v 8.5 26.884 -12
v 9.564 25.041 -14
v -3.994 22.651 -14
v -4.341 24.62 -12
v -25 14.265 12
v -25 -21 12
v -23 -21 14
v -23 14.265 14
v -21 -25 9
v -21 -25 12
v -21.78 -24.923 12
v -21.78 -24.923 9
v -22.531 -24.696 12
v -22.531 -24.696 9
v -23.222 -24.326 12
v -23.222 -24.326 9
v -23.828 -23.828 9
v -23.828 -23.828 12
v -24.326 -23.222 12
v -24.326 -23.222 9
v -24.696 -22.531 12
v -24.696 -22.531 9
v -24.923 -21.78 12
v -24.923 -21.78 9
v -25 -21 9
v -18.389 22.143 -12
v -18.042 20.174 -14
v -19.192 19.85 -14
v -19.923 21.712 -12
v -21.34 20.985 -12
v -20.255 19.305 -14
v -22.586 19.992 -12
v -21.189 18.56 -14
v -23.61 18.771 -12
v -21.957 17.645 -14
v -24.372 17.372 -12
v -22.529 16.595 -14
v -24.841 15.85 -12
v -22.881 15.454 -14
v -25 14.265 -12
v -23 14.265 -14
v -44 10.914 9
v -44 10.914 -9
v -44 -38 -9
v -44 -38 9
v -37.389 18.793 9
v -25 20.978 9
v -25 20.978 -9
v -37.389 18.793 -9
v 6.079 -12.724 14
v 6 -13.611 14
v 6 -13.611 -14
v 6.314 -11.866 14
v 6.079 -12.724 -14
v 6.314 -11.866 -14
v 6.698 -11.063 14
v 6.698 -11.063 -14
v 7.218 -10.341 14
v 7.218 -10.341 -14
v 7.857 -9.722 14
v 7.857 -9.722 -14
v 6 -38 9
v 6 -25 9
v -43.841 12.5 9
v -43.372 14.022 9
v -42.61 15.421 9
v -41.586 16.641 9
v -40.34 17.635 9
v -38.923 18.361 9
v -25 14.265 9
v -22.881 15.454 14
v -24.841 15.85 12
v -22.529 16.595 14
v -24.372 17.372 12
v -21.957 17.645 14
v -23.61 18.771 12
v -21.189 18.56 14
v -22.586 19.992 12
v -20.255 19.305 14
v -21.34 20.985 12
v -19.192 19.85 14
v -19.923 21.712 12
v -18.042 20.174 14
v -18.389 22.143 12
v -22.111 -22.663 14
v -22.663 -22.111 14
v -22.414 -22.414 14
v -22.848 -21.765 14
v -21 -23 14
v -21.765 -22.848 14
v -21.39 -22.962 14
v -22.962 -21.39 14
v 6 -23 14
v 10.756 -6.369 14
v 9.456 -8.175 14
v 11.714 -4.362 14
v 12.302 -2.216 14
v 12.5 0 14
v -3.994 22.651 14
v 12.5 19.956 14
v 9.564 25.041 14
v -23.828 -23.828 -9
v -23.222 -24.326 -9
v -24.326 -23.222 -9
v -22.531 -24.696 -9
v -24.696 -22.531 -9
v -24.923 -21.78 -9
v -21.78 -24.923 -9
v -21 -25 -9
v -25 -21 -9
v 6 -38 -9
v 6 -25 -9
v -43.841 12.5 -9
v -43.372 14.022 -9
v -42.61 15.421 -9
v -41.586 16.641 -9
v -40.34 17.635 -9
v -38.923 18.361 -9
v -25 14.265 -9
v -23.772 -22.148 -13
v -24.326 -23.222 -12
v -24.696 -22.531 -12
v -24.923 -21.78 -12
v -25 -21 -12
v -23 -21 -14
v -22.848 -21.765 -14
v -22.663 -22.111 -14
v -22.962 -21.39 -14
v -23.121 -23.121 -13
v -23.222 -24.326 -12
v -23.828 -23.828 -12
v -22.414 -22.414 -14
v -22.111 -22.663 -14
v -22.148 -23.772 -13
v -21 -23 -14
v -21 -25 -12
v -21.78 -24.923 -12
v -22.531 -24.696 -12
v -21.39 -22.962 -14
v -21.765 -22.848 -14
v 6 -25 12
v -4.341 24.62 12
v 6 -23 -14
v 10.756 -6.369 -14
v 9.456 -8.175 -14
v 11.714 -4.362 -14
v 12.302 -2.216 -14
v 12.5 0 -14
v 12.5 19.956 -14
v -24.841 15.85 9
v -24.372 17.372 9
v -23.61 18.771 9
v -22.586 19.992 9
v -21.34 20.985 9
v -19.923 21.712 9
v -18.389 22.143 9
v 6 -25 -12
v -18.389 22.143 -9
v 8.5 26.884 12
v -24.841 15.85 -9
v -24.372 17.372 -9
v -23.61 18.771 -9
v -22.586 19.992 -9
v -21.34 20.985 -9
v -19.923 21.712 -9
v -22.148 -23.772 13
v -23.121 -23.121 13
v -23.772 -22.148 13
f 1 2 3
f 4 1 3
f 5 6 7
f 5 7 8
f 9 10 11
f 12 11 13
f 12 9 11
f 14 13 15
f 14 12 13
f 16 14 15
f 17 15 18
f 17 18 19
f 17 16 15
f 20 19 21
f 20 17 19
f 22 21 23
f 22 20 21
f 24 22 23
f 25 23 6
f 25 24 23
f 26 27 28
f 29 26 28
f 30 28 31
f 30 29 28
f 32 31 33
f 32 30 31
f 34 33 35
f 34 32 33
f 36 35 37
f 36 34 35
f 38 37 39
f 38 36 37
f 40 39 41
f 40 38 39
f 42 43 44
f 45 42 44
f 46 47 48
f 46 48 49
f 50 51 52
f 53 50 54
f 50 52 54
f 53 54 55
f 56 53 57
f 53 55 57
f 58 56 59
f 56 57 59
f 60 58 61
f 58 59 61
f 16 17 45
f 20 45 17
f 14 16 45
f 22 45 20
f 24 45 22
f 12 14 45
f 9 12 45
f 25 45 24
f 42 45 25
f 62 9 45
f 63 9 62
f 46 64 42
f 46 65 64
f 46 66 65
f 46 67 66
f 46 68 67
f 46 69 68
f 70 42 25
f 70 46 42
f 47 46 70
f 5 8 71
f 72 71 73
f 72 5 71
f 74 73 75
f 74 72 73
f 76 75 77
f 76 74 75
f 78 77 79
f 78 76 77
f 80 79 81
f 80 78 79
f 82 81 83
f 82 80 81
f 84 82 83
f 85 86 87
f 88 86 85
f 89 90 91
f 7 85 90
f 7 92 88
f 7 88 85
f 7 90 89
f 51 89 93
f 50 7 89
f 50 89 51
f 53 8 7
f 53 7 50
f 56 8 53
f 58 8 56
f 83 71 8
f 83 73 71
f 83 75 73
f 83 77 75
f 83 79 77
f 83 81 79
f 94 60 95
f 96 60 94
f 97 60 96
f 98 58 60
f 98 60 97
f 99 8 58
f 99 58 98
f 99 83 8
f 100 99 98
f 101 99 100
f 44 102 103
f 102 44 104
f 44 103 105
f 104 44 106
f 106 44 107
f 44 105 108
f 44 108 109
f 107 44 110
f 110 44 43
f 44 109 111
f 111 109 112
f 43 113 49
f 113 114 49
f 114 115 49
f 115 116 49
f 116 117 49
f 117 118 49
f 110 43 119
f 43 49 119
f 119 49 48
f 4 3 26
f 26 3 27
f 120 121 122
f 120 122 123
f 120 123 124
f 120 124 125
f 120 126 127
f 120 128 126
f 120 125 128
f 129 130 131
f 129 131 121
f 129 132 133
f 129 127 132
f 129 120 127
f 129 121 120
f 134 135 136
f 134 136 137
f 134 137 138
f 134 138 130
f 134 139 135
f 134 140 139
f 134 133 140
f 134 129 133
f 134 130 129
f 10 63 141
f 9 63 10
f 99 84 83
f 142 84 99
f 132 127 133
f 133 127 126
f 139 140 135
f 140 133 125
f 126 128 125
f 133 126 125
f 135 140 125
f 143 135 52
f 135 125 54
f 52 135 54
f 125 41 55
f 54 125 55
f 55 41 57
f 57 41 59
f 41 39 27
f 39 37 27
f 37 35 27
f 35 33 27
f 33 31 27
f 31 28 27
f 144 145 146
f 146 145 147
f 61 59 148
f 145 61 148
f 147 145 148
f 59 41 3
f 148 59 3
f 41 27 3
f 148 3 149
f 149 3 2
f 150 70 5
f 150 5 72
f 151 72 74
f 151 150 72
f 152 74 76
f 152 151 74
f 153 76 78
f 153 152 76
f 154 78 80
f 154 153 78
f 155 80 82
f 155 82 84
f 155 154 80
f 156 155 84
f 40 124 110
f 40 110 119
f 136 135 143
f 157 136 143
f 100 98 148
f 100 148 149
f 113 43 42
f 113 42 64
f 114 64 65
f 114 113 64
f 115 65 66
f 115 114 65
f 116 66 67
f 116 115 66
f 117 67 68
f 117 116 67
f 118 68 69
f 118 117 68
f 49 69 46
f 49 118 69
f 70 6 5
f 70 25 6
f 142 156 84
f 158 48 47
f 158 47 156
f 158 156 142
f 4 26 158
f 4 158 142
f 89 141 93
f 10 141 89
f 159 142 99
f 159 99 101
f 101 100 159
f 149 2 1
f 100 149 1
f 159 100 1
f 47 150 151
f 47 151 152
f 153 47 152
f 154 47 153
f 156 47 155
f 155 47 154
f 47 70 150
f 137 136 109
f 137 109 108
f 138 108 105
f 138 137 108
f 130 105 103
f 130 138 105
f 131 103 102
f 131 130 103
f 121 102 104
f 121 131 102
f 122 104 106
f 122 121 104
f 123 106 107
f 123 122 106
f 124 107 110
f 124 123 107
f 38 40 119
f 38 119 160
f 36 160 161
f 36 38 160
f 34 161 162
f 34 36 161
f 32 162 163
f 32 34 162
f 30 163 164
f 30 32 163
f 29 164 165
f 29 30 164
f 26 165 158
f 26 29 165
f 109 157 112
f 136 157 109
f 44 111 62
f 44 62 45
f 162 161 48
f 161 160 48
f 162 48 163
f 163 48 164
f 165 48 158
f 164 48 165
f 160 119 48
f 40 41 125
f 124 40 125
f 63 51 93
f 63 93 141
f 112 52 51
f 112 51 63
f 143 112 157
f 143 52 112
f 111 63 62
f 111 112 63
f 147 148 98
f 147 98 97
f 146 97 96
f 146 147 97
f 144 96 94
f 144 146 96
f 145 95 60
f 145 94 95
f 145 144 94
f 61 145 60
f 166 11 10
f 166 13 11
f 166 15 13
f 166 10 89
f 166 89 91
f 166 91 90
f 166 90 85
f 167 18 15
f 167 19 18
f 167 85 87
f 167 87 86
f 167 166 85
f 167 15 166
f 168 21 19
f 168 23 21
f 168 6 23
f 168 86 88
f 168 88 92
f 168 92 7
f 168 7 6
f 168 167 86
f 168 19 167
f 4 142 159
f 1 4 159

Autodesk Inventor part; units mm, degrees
ref_plane "YZ Plane" through (0, 0, 0) normal (1, 0, 0) x (0, 1, 0)
ref_plane "XZ Plane" through (0, 0, 0) normal (0, 1, 0) x (-1, 0, 0)
ref_plane "XY Plane" through (0, 0, 0) normal (0, 0, 1) x (1, 0, 0)
sketch "Sketch1" plane through (0, 0, 0) normal (0, 0, 1) x (1, 0, 0)
  circle A0 centre (0, 0) radius 12.5
  circle A1 centre (0, 0) radius 25
  line L0 (-25, 0) -> (6, 0)
  line L1 (6, 0) -> (6, -25)
  line L2 (6, -25) -> (-25, -25)
  line L3 (-25, -25) -> (-25, 0)
  line L4 (12.5, 0) -> (12.5, 19.9562)
  line L5 (12.5, 19.9562) -> (8.5, 26.8844)
  line L6 (-4.3412, 24.6202) -> (8.5, 26.8844)
  line L7 (-25, 0) -> (-25, 20.9775)
  line L8 (-25, 20.9775) -> (-4.3412, 24.6202)
  line L9 (-20, -38) -> (0, -38) construction
  point P0 (6, -10.9659)
  point P1 (0, -25)
  point P2 (6, -24.2693)
  point P3 (-12.5, 0)
  dimension "d0" = 25
  dimension "d1" = 50
  dimension "d2" = 6
  dimension "d7" = 150
  dimension "d8" = 4
  dimension "d9" = 110
  dimension "d13" = 38
extrude "Extrusion1" add sketch "Sketch1" along normal mid plane 28 contours A0 L1 L0 | A0 L0 A1 L5 L4 | L0 L1 A0 | A0 L1 A1 L0 | L7 L8 A1 | A1 L2 L3 | L1 L2 A1 | A1 L6 L5
fillet "Fillet1" radius 5 1 edges at (6, -10.9659, 0)
sketch "Sketch2" plane through (0, 0, 0) normal (0, 0, 1) x (1, 0, 0)
  line L0 (8.5, 26.8844) -> (12.5, 19.9562) projected
  line L1 (12.5, 19.9562) -> (12.5, 0) projected
  arc A0 (7.8571, -9.7219) -> (12.5, 0) centre (0, 0) ccw projected
  arc A1 (7.8571, -9.7219) -> (6, -13.6107) centre (11, -13.6107) ccw projected
  line L2 (6, -13.6107) -> (6, -25) projected
  line L3 (6, -25) -> (-25, -25) projected
  line L4 (-25, -25) -> (-25, 20.9775) projected
  line L5 (-25, 20.9775) -> (8.5, 26.8844) projected
  line L6 (-25, 20.9775) -> (-44, 17.6273)
  line L7 (-44, 17.6273) -> (-44, -25)
  line L8 (-44, -25) -> (-25, -25)
  line L9 (8.5, 26.8844) -> (-25, 20.9775) projected
  line L10 (-44, -25) -> (6, -25)
  line L11 (6, -25) -> (6, -38)
  line L12 (6, -38) -> (-44, -38)
  line L13 (-44, -38) -> (-44, -25)
  line L14 (6, -25) -> (6, -13.6107) projected
  dimension "d14" = 38
  dimension "d21" = 50
extrude "Extrusion2" add sketch "Sketch2" along normal mid plane 18 contours L4 L8 L7 L6 | L3 L11 L12 L13 L8
fillet "Fillet4" radius 8 3 edges at (-25, 20.9775, -11.5) (-25, 20.9775, 11.5) (-44, 17.6273, 0)
fillet "Fillet3" radius 4 2 edges at (-25, -25, 11.5) (-25, -25, -11.5)
chamfer "Chamfer1" distance 2 angle 45 10 edges at (-4.9446, 24.5138, -14) (-23.1284, 19.407, -14) (-25, -3.3677, -14) (-23.8284, -23.8284, -14) (-7.5, -25, -14) (-4.9446, 24.5138, 14) (-23.1284, 19.407, 14) (-25, -3.3677, 14) (-23.8284, -23.8284, 14) (-7.5, -25, 14)
properties part number "Idler Block Left"
